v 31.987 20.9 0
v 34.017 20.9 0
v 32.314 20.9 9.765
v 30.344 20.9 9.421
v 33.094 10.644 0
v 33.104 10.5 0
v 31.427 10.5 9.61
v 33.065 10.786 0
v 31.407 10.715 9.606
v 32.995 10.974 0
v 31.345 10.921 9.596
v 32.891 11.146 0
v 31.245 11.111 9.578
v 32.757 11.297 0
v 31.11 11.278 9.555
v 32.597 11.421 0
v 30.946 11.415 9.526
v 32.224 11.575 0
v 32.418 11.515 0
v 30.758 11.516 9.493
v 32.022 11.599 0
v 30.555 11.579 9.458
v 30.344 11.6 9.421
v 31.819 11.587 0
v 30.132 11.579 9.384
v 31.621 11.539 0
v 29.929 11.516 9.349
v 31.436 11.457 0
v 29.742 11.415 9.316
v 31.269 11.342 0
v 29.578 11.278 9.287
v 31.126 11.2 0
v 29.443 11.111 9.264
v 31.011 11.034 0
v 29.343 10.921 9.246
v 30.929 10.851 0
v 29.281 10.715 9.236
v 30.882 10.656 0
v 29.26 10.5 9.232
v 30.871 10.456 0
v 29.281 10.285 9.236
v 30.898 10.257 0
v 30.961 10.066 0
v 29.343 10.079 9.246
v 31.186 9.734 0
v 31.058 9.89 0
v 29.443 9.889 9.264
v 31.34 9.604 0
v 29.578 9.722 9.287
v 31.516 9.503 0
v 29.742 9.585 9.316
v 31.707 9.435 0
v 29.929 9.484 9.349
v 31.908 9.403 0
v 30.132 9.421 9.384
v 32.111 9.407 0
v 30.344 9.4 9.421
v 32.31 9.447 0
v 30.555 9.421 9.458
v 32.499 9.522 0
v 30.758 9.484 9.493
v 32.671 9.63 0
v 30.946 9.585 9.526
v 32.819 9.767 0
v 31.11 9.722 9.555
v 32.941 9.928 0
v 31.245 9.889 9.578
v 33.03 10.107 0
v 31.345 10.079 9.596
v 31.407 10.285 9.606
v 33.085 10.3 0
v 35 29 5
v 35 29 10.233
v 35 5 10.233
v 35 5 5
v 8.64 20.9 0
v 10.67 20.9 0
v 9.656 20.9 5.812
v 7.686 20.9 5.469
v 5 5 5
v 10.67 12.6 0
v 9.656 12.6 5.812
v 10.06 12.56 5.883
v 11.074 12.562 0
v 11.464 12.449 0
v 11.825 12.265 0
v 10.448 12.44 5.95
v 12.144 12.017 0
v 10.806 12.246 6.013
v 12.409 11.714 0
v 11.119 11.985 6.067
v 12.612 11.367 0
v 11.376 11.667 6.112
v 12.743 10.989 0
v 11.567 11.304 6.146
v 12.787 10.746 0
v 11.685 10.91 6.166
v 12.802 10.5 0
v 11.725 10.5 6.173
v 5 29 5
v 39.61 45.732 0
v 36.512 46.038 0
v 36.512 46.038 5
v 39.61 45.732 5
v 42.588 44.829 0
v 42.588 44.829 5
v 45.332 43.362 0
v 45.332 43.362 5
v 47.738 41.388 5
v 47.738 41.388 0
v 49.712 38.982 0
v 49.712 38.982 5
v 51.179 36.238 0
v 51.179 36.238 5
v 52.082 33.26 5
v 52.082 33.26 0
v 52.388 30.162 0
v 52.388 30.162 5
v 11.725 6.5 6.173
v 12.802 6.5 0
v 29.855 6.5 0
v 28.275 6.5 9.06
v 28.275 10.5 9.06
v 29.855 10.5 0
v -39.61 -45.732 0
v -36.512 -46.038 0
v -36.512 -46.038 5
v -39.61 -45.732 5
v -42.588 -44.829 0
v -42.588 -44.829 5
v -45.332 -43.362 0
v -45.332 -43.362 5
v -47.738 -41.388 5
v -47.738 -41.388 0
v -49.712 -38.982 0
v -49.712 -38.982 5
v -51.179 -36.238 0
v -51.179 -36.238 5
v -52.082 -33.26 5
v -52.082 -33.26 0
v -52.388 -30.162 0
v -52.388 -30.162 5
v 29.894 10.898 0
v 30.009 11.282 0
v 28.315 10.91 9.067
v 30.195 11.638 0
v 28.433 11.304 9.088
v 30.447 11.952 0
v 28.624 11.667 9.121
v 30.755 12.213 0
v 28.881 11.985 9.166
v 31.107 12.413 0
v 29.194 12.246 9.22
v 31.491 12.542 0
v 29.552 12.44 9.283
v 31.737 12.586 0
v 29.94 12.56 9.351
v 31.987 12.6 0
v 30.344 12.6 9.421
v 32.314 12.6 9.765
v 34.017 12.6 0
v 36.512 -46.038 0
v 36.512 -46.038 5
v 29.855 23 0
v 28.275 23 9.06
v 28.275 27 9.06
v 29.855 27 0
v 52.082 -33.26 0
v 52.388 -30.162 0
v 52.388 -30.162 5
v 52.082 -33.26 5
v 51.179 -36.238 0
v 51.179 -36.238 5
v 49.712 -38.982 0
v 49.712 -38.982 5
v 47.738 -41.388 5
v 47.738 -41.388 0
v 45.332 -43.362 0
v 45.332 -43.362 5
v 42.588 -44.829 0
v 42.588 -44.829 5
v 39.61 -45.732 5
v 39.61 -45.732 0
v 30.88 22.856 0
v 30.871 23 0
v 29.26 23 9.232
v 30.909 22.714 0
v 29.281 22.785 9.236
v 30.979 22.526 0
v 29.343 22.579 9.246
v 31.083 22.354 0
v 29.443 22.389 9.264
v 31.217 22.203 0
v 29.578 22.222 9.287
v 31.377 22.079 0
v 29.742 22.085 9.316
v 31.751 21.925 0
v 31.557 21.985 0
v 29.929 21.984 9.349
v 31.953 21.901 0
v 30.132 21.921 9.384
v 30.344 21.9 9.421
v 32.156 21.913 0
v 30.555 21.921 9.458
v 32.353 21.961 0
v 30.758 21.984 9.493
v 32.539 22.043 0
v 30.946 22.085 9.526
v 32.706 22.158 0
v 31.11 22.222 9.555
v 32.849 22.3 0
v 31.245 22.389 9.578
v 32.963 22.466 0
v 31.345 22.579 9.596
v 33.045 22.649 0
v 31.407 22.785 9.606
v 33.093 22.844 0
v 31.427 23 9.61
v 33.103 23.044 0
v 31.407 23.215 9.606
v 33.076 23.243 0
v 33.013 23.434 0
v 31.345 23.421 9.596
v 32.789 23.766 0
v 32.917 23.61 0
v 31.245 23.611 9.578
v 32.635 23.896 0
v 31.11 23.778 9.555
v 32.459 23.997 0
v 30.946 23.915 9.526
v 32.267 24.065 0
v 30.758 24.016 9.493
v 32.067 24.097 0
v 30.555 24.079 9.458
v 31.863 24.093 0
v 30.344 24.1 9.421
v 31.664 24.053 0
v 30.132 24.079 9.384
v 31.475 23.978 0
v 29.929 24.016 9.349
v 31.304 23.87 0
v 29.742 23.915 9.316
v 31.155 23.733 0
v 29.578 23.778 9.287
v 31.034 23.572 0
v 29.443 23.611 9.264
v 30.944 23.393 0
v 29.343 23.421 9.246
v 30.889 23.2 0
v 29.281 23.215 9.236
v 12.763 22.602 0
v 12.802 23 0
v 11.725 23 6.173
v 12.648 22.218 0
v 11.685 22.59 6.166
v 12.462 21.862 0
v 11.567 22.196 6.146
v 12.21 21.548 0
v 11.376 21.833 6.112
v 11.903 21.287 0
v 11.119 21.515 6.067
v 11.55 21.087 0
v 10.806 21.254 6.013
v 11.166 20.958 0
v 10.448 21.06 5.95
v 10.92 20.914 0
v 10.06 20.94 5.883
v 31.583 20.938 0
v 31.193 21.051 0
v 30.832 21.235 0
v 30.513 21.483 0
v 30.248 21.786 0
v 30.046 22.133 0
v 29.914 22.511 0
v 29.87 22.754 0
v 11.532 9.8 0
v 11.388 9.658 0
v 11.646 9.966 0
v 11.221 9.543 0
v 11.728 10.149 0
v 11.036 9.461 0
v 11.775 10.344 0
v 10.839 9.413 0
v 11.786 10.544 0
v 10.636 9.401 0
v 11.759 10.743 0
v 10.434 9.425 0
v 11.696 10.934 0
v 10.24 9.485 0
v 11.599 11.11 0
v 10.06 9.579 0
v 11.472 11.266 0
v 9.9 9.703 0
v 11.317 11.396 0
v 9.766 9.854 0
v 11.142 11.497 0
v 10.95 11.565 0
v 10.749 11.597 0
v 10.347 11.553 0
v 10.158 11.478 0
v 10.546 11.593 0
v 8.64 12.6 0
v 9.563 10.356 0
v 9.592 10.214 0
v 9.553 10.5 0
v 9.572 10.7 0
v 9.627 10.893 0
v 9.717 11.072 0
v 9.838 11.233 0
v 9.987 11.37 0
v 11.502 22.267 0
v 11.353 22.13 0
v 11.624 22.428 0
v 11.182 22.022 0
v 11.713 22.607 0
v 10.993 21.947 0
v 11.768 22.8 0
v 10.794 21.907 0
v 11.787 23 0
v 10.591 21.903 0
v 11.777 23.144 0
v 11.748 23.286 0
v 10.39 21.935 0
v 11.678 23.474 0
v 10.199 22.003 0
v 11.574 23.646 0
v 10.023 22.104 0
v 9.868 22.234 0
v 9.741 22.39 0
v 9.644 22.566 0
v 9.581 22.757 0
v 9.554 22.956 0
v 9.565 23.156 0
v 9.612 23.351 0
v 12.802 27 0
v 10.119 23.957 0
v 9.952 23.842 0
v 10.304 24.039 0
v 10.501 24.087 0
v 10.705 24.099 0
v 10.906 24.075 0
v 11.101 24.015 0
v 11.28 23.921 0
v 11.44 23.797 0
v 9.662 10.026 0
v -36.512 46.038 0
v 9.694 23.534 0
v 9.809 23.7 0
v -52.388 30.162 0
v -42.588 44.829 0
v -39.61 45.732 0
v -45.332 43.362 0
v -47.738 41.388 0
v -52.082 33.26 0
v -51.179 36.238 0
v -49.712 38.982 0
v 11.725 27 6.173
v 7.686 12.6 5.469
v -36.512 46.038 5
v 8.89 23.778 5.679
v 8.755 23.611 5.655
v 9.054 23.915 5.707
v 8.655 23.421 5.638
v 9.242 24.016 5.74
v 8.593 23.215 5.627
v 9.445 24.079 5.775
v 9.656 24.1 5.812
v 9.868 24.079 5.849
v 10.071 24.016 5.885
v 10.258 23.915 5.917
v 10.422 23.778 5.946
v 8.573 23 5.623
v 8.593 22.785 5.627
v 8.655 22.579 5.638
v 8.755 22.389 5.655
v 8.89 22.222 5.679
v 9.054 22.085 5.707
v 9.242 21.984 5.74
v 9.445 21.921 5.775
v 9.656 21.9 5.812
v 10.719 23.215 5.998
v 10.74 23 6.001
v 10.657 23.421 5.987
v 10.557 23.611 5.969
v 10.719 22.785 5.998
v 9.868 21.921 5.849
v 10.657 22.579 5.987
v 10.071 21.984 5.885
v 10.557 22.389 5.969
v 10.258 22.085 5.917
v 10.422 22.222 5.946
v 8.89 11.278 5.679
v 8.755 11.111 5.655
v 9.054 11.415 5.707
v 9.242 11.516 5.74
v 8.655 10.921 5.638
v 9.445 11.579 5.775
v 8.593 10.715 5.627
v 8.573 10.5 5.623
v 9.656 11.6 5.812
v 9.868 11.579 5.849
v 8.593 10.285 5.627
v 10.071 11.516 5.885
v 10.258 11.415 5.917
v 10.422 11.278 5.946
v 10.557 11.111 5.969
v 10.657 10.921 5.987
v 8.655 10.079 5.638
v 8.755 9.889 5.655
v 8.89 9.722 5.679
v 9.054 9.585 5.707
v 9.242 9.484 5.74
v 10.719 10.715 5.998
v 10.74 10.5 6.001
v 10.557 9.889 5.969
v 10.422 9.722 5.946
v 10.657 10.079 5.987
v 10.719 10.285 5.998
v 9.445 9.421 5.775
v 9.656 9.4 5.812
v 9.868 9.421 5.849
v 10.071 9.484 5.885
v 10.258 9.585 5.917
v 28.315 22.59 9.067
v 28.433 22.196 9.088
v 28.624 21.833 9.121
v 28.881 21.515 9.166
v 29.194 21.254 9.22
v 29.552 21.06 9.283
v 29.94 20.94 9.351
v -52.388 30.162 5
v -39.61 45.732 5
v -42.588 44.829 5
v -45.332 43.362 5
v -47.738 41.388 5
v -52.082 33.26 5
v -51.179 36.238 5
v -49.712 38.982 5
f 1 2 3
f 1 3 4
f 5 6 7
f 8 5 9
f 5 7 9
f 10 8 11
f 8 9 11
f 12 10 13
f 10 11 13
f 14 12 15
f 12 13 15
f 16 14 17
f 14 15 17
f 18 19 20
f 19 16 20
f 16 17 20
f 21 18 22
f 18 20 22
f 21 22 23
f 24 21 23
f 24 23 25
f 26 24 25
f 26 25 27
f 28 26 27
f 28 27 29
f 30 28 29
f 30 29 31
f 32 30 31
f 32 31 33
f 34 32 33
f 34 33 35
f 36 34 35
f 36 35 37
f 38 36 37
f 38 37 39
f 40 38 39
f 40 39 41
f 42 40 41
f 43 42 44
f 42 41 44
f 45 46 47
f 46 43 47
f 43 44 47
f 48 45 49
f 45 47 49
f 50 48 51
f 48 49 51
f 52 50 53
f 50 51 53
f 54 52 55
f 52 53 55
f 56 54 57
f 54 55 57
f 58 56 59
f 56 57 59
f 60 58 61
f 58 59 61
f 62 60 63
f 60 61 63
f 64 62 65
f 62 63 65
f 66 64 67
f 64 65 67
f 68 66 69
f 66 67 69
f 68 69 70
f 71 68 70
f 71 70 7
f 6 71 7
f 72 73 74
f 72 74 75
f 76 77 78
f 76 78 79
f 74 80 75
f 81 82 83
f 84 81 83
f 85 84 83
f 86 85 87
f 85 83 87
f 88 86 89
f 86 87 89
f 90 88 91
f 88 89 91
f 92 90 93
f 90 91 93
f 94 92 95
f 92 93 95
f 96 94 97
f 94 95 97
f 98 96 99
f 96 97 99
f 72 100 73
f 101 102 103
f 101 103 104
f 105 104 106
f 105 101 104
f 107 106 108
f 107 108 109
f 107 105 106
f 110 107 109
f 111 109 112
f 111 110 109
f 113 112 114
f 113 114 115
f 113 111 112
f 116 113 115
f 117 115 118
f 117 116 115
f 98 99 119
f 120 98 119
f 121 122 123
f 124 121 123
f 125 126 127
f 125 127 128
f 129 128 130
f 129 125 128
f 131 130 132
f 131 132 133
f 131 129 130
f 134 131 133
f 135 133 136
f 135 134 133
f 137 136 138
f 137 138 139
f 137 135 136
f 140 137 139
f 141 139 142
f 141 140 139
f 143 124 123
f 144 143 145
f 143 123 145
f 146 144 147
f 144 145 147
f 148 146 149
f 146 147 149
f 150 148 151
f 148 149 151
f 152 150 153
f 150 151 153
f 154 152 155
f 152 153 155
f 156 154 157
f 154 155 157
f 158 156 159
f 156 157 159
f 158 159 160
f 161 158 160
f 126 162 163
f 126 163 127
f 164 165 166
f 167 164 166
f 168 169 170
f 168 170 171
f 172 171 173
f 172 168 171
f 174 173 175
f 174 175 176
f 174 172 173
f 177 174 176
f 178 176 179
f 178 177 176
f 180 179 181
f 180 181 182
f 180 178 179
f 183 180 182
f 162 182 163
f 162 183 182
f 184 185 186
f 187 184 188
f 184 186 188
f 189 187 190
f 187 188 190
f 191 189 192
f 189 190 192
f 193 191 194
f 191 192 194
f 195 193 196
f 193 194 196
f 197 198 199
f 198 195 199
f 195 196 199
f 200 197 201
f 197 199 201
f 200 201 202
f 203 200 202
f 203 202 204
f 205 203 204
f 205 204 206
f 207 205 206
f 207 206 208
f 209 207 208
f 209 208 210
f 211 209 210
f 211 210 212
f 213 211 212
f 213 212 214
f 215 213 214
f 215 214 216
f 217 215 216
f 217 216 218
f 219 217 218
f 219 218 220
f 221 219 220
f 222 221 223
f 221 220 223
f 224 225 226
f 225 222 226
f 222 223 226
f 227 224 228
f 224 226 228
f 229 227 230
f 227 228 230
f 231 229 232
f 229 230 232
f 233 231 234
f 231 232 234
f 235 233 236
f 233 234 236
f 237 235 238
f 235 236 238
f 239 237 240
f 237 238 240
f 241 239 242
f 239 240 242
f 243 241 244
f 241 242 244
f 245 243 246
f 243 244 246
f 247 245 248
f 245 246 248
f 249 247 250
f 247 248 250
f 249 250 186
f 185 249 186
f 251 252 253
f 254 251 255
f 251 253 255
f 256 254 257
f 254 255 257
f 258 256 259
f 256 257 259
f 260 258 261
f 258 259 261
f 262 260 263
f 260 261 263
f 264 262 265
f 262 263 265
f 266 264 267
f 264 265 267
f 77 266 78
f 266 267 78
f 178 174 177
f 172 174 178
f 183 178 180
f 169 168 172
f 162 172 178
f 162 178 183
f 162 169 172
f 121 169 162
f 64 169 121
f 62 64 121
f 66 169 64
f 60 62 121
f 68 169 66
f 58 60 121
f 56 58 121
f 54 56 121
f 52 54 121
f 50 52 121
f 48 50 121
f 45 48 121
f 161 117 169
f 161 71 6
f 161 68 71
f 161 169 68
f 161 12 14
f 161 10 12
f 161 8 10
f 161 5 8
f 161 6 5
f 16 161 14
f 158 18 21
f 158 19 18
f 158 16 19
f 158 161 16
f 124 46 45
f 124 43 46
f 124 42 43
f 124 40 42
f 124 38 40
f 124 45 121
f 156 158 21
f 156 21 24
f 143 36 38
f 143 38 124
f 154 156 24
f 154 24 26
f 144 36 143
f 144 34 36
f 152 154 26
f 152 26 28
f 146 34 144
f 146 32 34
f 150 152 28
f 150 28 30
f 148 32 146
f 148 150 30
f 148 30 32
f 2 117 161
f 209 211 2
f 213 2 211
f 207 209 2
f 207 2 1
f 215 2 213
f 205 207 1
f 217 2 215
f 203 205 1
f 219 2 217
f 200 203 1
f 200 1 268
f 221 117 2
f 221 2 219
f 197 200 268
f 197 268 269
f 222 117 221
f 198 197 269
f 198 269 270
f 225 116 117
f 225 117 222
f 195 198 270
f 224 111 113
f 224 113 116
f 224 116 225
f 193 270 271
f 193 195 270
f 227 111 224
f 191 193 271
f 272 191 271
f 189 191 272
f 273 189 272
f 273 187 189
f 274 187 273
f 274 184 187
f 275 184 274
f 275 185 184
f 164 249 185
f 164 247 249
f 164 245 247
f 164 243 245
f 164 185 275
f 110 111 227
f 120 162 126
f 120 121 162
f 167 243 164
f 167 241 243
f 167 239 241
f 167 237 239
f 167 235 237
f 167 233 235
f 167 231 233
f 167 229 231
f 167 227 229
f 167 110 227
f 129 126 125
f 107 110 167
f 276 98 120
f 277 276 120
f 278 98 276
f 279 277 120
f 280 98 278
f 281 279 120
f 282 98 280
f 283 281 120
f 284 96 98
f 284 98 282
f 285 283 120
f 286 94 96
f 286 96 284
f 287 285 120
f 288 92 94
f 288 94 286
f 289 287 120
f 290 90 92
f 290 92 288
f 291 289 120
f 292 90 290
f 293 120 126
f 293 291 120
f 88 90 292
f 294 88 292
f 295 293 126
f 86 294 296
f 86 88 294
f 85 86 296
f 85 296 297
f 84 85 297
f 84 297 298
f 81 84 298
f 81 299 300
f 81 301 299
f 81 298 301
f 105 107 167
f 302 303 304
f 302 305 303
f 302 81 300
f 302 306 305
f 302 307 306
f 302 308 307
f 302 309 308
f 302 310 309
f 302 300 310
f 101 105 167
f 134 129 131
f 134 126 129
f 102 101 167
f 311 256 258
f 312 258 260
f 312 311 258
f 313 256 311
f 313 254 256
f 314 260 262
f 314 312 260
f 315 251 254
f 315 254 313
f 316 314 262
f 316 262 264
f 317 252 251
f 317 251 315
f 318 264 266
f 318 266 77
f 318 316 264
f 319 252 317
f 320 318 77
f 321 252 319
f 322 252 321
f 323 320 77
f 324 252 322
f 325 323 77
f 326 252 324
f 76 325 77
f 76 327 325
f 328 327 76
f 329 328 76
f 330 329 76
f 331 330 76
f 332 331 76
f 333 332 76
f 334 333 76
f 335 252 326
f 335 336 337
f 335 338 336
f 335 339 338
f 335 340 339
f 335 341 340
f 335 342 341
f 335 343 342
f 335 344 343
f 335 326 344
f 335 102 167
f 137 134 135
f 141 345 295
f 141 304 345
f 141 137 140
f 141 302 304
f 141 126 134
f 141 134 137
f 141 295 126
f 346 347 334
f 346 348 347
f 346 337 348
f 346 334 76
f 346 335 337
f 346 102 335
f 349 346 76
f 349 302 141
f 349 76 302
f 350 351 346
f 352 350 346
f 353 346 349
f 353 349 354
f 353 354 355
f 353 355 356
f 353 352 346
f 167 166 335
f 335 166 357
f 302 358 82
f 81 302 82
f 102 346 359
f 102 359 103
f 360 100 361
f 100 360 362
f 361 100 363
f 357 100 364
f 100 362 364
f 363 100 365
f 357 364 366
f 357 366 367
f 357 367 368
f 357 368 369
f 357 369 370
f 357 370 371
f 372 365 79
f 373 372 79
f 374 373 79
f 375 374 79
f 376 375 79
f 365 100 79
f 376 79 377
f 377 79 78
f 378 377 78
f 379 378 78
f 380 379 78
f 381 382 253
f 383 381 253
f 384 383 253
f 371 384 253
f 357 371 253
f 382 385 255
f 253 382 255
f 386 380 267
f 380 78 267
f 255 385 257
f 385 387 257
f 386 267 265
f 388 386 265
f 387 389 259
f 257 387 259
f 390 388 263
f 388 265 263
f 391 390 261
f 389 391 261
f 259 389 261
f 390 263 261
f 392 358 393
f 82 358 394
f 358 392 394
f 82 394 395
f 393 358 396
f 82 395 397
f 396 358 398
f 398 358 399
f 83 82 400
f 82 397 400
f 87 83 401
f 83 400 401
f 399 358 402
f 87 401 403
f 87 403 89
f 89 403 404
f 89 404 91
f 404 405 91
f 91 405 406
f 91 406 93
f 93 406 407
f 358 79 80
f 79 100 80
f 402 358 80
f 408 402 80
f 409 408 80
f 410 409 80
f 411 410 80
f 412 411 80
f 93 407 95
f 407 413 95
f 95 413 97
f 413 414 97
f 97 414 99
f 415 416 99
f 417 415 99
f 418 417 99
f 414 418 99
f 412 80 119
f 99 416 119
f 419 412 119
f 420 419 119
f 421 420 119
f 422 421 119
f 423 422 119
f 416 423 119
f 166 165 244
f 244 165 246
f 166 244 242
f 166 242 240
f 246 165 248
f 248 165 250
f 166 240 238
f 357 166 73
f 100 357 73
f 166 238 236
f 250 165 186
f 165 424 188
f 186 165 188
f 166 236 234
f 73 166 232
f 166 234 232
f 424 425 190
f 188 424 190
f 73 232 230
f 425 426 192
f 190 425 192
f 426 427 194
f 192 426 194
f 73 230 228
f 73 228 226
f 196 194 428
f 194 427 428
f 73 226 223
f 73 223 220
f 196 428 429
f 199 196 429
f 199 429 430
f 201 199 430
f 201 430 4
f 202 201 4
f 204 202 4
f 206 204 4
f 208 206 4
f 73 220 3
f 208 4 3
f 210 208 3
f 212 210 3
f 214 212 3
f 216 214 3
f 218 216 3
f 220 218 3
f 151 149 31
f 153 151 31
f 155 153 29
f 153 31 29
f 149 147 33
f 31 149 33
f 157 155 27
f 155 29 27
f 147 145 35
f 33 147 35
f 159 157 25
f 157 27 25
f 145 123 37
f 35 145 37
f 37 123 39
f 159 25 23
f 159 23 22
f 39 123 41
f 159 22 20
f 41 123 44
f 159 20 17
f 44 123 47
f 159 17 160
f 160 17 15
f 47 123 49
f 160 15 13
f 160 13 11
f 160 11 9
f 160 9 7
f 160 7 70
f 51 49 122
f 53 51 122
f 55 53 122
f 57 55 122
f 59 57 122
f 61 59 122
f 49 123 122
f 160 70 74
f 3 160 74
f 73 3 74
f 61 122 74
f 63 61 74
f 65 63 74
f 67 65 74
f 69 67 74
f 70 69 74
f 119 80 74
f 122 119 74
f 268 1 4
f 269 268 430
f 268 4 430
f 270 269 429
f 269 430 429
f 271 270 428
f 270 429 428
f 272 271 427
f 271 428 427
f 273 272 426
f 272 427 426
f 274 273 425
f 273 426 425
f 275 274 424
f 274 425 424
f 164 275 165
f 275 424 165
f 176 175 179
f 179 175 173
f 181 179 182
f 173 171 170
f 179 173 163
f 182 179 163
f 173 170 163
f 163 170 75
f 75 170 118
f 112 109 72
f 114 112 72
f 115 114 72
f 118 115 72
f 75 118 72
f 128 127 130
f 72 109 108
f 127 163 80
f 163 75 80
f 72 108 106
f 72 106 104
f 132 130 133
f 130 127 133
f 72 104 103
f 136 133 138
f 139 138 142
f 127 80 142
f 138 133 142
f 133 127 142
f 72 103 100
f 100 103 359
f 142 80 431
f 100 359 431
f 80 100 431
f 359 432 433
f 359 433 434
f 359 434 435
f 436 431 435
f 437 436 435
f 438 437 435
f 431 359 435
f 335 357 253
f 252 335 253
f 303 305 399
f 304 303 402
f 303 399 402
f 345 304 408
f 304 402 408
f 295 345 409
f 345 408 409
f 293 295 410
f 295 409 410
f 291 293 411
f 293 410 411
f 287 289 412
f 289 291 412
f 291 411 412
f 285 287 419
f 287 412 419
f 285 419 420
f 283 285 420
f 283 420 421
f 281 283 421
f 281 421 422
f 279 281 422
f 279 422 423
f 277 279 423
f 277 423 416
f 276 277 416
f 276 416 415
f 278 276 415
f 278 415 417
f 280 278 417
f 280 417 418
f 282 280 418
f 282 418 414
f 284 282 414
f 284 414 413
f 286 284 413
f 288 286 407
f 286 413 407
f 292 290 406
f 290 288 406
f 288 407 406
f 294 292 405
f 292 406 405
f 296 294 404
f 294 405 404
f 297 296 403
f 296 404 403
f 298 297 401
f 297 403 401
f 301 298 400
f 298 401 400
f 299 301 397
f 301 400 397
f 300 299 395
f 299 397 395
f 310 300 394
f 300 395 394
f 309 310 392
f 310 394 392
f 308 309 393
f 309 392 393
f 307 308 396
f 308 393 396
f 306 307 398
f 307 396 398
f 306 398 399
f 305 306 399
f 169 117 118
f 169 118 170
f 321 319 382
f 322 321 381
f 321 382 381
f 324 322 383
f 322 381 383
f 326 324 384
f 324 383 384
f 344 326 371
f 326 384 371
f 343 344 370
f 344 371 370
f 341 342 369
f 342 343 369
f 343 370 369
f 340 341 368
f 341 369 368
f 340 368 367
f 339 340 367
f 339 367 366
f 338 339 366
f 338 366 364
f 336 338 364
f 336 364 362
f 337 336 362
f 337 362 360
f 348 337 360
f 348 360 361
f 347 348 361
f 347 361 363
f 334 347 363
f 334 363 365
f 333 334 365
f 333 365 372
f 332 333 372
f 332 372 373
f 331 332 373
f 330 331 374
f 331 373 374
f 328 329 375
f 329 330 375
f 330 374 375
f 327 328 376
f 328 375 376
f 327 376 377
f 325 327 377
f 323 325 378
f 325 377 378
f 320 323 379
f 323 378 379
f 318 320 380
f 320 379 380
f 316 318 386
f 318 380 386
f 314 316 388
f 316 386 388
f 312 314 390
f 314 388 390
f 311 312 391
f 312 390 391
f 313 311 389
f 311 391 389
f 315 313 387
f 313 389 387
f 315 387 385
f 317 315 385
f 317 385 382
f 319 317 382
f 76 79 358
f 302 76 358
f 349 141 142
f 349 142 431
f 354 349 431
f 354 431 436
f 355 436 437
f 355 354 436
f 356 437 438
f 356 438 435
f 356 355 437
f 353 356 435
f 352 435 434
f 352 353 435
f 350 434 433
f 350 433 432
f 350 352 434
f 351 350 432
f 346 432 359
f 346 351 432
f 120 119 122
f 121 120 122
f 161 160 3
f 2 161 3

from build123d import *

# Parameters (mm, degrees)
BOSS_EXTRUDE1_DEPTH = 5
BOSS_EXTRUDE2_START = 5
BOSS_EXTRUDE2_DEPTH = 24
SKETCH7_R           = 1.1
CUT_EXTRUDE1_DEPTH  = 71.543483188


with BuildPart() as part:
    # Sketch1 → Boss-Extrude1 (new body)
    with BuildSketch(Plane.XY):
        with BuildLine():
            Line((-36.5125, 46.0375), (36.5125, 46.0375))
            ThreePointArc((36.5125, 46.0375), (47.737820151, 41.387820151), (52.3875, 30.1625))
            Line((52.3875, 30.1625), (52.3875, -30.1625))
            ThreePointArc((52.3875, -30.1625), (47.737820151, -41.387820151), (36.5125, -46.0375))
            Line((36.5125, -46.0375), (-36.5125, -46.0375))
            ThreePointArc((-36.5125, -46.0375), (-47.737820151, -41.387820151), (-52.3875, -30.1625))
            Line((-52.3875, -30.1625), (-52.3875, 30.1625))
            ThreePointArc((-52.3875, 30.1625), (-47.737820151, 41.387820151), (-36.5125, 46.0375))
        make_face()
    extrude(amount=BOSS_EXTRUDE1_DEPTH)

    # Sketch5 → Boss-Extrude2 (add)
    with BuildSketch(Plane(origin=(0, 0, 0), x_dir=(1, 0, 0), z_dir=(0, 1, 0)).offset(BOSS_EXTRUDE2_START)):
        Polygon((5, -5), (35, -10.233130218), (35, -5), align=None)
    extrude(amount=BOSS_EXTRUDE2_DEPTH)

    # Sketch7 → Cut-Extrude1 (cut, through all)
    with BuildSketch(Plane(origin=(-0.698782941, 0, 4.005917559), x_dir=(0.985124383035979, 0, 0.17184280592443155), z_dir=(-0.17184280592443155, 0, 0.985124383035979))):
        with Locations((10.511339581, 23)):
            Circle(SKETCH7_R)
        with Locations(Location((31.511339581, 23, 0), (0, 0, 180))):
            Circle(SKETCH7_R)
        with Locations((31.511339581, 10.5)):
            Circle(SKETCH7_R)
        with Locations(Location((10.511339581, 10.5, 0), (0, 0, 180))):
            Circle(SKETCH7_R)
        with BuildLine():
            Line((29.411339581, 27), (12.611339581, 27))
            Line((12.611339581, 27), (12.611339581, 23))
            ThreePointArc((12.611339581, 23), (11.996263821, 21.51507576), (10.511339581, 20.9))
            Line((10.511339581, 20.9), (8.511339581, 20.9))
            Line((8.511339581, 20.9), (8.511339581, 12.6))
            Line((8.511339581, 12.6), (10.511339581, 12.6))
            ThreePointArc((10.511339581, 12.6), (11.996263821, 11.98492424), (12.611339581, 10.5))
            Line((12.611339581, 10.5), (12.611339581, 6.5))
            Line((12.611339581, 6.5), (29.411339581, 6.5))
            Line((29.411339581, 6.5), (29.411339581, 10.5))
            ThreePointArc((29.411339581, 10.5), (30.02641534, 11.98492424), (31.511339581, 12.6))
            Line((31.511339581, 12.6), (33.511339581, 12.6))
            Line((33.511339581, 12.6), (33.511339581, 20.9))
            Line((33.511339581, 20.9), (31.511339581, 20.9))
            ThreePointArc((31.511339581, 20.9), (30.02641534, 21.51507576), (29.411339581, 23))
            Line((29.411339581, 23), (29.411339581, 27))
        make_face()
    extrude(amount=-CUT_EXTRUDE1_DEPTH, mode=Mode.SUBTRACT)


solid = part.part
